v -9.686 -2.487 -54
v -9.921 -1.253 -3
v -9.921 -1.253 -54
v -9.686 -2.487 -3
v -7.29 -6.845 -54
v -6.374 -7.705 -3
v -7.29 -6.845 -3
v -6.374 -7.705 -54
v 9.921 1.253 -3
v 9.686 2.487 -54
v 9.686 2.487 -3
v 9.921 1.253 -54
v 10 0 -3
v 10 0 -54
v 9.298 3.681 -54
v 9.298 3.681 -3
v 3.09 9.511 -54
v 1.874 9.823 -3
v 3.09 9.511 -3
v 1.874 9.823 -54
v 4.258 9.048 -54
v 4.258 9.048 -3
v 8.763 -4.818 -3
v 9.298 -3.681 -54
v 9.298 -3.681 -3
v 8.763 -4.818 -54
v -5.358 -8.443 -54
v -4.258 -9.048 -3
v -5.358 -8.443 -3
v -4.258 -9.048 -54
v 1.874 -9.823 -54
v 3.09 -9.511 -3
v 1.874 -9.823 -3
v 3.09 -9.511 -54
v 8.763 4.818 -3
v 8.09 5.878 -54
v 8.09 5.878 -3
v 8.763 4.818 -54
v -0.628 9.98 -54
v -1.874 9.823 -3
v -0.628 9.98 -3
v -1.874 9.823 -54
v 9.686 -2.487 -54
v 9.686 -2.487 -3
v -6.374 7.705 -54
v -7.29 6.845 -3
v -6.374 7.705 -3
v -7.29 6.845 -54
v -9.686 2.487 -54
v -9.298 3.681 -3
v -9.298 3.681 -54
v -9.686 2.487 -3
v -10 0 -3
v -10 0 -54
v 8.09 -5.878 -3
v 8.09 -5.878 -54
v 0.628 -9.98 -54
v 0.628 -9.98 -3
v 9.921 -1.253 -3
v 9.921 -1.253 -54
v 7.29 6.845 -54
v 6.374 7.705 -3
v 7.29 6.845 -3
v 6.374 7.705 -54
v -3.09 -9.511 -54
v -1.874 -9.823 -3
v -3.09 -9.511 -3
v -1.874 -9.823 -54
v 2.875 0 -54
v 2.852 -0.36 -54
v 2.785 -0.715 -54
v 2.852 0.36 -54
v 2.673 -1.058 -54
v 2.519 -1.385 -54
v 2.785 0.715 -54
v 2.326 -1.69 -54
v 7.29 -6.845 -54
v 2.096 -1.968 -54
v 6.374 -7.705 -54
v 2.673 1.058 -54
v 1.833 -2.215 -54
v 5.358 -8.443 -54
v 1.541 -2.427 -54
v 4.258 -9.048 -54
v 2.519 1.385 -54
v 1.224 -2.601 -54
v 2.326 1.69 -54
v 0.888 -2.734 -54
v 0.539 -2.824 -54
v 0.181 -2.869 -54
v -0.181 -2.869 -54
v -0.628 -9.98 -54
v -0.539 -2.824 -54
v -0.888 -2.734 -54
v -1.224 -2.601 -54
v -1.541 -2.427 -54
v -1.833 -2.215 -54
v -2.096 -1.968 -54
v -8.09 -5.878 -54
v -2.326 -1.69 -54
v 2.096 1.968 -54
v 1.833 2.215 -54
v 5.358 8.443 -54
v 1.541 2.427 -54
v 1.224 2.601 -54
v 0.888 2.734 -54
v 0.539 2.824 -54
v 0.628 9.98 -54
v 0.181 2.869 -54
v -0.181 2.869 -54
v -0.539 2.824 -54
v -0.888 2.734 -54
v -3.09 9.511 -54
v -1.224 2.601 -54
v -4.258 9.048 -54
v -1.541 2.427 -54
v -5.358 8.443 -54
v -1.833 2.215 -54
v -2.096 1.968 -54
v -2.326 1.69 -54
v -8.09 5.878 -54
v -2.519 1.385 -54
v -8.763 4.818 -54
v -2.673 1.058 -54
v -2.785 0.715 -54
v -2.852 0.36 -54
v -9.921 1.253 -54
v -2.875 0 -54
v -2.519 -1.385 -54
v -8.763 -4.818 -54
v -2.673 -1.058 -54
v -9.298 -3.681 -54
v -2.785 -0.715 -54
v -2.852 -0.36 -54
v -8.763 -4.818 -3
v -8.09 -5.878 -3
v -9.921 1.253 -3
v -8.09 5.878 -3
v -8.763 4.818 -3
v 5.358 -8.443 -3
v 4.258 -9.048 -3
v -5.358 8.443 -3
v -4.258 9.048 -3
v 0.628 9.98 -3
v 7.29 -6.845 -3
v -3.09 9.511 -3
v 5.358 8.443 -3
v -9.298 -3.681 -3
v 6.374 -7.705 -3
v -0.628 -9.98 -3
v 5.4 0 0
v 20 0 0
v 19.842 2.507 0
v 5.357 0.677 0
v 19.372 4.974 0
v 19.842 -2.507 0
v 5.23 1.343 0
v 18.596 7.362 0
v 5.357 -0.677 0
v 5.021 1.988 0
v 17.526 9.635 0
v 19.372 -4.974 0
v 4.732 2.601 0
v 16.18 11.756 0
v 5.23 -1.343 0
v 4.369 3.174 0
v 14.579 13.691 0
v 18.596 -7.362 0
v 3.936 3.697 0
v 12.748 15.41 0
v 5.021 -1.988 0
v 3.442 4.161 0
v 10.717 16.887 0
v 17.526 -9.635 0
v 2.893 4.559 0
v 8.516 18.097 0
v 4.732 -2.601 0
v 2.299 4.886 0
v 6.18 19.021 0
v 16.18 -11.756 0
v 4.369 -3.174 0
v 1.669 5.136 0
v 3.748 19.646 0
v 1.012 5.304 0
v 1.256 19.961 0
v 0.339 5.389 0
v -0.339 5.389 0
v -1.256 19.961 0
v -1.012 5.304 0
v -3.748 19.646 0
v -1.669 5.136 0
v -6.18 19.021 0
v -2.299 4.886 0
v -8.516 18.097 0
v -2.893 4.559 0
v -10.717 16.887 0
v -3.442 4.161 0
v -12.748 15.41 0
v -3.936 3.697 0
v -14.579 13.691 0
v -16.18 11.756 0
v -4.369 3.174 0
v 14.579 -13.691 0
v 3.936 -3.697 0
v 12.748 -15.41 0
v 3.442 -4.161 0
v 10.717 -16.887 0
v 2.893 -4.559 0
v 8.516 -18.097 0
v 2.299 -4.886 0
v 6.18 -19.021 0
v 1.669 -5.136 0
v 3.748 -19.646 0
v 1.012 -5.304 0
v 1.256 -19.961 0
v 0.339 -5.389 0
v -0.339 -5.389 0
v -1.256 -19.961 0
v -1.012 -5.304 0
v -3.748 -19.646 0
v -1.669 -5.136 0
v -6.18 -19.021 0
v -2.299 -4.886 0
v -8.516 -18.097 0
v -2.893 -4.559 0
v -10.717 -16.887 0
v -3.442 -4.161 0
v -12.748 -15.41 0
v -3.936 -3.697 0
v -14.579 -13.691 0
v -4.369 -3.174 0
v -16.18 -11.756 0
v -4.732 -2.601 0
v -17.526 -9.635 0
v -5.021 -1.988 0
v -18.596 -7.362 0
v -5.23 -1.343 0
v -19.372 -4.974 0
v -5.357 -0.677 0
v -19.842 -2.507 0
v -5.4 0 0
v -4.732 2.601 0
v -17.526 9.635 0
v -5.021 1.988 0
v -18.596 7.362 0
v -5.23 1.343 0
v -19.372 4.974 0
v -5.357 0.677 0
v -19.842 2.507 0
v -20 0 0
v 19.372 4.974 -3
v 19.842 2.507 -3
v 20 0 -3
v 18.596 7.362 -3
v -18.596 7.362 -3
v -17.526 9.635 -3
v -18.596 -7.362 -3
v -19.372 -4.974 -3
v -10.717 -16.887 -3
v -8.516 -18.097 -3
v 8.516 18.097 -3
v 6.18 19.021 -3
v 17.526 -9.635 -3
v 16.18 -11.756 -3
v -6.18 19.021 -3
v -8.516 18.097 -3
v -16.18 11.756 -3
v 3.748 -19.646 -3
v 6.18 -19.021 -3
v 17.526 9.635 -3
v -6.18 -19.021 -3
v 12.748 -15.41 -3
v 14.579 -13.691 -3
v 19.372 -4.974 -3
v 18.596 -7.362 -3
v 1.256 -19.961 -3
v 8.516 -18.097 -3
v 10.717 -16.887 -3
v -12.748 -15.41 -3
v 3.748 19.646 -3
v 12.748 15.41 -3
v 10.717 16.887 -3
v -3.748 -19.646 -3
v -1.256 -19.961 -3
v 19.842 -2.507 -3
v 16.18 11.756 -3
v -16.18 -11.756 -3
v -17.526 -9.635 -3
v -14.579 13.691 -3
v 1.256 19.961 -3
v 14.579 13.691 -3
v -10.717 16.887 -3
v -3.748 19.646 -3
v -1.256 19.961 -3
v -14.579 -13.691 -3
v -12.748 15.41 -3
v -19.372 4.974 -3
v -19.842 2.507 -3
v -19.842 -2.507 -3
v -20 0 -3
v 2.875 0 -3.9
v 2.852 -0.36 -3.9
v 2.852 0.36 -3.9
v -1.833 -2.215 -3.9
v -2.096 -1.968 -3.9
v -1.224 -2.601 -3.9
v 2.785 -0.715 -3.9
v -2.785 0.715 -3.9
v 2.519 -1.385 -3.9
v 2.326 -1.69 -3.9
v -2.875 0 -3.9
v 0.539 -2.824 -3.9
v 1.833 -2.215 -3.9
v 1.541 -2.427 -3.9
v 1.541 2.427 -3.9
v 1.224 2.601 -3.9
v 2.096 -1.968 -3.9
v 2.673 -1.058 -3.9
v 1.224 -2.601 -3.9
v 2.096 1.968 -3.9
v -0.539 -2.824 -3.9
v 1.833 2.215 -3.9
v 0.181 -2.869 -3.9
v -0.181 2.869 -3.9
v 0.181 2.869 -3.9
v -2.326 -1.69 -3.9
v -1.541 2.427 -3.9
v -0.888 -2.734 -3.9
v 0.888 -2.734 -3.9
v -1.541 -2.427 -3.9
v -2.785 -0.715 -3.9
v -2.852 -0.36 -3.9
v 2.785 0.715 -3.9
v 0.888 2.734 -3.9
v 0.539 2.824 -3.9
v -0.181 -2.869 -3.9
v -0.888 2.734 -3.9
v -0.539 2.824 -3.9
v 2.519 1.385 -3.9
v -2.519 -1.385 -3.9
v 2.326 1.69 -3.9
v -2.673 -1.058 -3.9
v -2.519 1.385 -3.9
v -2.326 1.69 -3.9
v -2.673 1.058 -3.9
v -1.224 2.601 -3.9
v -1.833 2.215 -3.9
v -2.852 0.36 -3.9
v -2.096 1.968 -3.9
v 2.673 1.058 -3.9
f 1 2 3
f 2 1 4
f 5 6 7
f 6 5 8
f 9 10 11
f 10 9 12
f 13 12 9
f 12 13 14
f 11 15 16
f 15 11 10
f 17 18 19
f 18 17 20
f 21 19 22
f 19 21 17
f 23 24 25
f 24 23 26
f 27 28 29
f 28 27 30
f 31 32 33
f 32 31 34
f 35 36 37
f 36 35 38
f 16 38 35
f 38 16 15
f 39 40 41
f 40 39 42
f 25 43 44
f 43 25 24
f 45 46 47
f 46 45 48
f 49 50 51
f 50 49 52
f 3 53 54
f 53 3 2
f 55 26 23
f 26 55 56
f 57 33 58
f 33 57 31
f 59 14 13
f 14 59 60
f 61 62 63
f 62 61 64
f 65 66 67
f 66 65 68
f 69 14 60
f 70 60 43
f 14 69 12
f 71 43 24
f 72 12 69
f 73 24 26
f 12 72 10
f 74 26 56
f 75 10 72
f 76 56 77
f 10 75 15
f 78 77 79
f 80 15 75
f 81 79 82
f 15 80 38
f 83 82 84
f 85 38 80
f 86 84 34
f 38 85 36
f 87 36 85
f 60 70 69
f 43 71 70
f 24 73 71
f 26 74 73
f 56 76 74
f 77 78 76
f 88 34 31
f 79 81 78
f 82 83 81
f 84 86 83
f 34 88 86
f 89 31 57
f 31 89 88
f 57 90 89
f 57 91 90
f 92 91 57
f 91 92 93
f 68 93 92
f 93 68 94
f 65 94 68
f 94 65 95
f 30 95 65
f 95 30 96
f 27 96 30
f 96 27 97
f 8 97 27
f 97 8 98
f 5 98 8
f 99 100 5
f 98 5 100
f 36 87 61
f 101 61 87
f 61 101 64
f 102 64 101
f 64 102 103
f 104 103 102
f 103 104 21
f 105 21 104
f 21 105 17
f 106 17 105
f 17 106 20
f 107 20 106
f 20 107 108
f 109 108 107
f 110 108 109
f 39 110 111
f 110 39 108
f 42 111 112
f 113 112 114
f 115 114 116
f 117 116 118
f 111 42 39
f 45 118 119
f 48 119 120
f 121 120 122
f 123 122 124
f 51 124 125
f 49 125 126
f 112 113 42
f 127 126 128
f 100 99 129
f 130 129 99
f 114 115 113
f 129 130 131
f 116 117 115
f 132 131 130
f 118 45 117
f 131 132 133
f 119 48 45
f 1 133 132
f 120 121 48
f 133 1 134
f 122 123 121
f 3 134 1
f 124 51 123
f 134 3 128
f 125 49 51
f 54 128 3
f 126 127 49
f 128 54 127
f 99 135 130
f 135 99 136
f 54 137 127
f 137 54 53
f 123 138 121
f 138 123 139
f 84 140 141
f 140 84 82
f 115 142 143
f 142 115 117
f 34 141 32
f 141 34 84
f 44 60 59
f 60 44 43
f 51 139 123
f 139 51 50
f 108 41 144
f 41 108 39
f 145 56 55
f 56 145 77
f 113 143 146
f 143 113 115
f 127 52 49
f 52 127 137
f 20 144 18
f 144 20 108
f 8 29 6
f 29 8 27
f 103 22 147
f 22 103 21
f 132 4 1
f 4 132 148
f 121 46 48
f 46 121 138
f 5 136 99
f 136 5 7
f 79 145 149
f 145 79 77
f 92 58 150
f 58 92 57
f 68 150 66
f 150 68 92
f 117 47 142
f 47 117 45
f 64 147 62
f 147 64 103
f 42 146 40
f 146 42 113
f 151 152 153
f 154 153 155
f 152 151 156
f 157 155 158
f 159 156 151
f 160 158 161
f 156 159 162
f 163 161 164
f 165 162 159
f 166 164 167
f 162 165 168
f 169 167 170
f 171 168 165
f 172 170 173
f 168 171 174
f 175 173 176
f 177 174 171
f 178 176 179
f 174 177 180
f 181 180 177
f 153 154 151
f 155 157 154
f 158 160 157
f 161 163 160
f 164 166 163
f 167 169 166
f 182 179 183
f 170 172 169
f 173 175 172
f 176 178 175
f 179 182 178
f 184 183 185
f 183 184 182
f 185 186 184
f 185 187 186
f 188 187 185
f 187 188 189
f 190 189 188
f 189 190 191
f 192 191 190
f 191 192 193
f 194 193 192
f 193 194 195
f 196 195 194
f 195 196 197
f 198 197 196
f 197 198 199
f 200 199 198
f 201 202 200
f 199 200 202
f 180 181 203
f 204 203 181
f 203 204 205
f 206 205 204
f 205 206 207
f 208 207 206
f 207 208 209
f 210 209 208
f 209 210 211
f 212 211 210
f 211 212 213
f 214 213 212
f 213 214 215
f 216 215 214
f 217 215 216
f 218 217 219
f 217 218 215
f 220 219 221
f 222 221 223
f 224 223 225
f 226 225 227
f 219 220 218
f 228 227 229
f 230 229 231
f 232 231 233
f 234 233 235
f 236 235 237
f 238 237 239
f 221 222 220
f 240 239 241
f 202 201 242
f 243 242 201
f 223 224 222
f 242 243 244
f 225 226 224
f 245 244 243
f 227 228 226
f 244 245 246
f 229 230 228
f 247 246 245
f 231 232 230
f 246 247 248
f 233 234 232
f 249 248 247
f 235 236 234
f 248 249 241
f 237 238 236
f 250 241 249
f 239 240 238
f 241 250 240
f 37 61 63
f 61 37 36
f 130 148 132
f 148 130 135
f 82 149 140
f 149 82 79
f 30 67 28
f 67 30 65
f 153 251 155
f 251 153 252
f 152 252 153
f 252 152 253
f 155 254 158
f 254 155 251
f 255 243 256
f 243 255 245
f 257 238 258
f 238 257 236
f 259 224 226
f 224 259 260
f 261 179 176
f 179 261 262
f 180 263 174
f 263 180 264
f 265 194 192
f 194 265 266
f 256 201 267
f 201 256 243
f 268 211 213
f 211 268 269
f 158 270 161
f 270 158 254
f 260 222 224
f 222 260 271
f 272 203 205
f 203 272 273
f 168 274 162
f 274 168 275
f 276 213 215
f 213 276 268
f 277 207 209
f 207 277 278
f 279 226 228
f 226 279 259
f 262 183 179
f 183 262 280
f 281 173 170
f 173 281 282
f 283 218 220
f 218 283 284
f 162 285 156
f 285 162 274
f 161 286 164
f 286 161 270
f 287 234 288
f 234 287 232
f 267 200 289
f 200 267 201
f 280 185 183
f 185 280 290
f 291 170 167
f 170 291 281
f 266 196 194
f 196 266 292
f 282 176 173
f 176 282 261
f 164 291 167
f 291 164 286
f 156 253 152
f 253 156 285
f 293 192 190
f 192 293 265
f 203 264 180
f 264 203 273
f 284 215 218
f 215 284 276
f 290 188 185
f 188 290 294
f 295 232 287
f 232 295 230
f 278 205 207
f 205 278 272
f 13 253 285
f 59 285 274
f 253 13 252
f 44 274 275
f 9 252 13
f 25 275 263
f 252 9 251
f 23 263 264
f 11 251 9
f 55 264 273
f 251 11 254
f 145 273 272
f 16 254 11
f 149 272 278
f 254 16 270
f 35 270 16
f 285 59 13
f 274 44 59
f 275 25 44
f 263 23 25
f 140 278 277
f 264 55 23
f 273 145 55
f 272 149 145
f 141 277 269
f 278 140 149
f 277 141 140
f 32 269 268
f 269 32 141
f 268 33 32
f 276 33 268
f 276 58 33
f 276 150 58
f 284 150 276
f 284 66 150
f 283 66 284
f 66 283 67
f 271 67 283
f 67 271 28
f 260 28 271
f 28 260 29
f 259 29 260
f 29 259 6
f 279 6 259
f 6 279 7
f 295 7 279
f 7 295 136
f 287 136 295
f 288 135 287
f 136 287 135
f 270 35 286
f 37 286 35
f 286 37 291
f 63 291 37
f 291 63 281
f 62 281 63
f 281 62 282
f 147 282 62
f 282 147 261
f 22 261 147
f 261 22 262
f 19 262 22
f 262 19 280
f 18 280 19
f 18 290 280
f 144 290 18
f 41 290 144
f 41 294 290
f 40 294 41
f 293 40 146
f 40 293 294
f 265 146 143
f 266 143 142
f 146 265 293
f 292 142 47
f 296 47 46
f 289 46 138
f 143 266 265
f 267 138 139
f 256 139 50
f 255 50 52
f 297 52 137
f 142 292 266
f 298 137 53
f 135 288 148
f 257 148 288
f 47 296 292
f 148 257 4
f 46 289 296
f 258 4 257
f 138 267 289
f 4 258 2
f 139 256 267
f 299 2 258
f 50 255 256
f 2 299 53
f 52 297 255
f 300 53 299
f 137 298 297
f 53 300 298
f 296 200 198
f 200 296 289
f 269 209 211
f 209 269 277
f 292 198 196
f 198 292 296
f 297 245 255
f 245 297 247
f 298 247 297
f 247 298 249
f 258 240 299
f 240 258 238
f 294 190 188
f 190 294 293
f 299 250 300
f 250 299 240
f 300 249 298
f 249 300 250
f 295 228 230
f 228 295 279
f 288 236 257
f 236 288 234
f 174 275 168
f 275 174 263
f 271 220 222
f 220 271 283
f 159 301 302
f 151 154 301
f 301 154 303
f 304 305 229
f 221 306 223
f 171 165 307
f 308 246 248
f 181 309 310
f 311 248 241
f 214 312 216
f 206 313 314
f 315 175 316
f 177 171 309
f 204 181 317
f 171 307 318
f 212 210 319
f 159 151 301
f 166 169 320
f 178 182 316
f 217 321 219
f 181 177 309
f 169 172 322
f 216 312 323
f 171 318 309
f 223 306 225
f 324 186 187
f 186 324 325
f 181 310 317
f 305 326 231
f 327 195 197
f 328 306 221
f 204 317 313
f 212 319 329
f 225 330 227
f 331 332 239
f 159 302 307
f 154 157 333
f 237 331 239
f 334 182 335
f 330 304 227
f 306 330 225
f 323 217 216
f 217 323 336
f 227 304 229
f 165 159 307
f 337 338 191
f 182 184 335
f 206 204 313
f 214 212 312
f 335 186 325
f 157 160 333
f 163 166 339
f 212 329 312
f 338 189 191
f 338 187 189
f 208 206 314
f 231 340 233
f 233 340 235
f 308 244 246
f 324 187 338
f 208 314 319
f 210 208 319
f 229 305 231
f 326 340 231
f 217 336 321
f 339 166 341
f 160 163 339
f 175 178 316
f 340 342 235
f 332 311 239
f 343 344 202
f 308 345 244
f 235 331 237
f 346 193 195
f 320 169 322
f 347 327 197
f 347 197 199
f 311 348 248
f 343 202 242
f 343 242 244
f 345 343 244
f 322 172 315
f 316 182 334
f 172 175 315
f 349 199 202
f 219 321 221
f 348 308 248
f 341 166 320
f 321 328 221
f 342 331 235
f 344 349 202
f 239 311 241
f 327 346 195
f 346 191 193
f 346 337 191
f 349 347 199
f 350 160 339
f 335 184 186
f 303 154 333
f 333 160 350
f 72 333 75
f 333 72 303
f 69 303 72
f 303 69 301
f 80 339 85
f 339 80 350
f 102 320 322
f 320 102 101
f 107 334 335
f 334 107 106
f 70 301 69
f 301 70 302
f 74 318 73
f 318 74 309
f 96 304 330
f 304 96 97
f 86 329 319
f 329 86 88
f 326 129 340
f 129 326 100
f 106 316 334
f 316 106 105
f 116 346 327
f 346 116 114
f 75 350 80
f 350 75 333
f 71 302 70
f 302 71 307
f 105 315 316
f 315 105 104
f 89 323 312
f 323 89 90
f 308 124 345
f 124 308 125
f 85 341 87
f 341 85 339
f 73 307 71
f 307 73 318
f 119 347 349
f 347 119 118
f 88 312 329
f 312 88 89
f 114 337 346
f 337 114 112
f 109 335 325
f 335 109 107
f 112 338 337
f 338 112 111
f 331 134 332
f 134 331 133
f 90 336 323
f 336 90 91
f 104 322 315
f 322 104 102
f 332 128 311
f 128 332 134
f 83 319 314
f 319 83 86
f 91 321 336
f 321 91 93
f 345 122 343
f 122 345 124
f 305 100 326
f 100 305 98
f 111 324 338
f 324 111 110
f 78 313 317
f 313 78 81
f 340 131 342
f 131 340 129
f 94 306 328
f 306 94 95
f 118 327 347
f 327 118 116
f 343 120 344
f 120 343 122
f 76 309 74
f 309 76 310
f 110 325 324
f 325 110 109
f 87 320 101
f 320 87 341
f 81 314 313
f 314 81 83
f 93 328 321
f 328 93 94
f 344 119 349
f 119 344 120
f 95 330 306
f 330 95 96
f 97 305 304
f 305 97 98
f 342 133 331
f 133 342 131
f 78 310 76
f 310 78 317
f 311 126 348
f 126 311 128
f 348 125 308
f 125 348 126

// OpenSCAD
$fn = 50;


difference() {
	union() {
		translate(v = [0, 0, -54.0000000000]) {
			cylinder(h = 54, r = 10.0000000000);
		}
		translate(v = [0, 0, -3.0000000000]) {
			cylinder(h = 3, r = 20.0000000000);
		}
	}
	union() {
		translate(v = [0, 0, 0]) {
			rotate(a = [0, 0, 0]) {
				difference() {
					union() {
						#translate(v = [0, 0, -54.0000000000]) {
							cylinder(h = 54, r = 2.6000000000);
						}
						#translate(v = [0, 0, -3.9000000000]) {
							cylinder(h = 3.9000000000, r1 = 2.8750000000, r2 = 5.4000000000);
						}
						#translate(v = [0, 0, -54.0000000000]) {
							cylinder(h = 54, r = 2.8750000000);
						}
						#translate(v = [0, 0, -54.0000000000]) {
							cylinder(h = 54, r = 2.6000000000);
						}
					}
					union();
				}
			}
		}
	}
}
